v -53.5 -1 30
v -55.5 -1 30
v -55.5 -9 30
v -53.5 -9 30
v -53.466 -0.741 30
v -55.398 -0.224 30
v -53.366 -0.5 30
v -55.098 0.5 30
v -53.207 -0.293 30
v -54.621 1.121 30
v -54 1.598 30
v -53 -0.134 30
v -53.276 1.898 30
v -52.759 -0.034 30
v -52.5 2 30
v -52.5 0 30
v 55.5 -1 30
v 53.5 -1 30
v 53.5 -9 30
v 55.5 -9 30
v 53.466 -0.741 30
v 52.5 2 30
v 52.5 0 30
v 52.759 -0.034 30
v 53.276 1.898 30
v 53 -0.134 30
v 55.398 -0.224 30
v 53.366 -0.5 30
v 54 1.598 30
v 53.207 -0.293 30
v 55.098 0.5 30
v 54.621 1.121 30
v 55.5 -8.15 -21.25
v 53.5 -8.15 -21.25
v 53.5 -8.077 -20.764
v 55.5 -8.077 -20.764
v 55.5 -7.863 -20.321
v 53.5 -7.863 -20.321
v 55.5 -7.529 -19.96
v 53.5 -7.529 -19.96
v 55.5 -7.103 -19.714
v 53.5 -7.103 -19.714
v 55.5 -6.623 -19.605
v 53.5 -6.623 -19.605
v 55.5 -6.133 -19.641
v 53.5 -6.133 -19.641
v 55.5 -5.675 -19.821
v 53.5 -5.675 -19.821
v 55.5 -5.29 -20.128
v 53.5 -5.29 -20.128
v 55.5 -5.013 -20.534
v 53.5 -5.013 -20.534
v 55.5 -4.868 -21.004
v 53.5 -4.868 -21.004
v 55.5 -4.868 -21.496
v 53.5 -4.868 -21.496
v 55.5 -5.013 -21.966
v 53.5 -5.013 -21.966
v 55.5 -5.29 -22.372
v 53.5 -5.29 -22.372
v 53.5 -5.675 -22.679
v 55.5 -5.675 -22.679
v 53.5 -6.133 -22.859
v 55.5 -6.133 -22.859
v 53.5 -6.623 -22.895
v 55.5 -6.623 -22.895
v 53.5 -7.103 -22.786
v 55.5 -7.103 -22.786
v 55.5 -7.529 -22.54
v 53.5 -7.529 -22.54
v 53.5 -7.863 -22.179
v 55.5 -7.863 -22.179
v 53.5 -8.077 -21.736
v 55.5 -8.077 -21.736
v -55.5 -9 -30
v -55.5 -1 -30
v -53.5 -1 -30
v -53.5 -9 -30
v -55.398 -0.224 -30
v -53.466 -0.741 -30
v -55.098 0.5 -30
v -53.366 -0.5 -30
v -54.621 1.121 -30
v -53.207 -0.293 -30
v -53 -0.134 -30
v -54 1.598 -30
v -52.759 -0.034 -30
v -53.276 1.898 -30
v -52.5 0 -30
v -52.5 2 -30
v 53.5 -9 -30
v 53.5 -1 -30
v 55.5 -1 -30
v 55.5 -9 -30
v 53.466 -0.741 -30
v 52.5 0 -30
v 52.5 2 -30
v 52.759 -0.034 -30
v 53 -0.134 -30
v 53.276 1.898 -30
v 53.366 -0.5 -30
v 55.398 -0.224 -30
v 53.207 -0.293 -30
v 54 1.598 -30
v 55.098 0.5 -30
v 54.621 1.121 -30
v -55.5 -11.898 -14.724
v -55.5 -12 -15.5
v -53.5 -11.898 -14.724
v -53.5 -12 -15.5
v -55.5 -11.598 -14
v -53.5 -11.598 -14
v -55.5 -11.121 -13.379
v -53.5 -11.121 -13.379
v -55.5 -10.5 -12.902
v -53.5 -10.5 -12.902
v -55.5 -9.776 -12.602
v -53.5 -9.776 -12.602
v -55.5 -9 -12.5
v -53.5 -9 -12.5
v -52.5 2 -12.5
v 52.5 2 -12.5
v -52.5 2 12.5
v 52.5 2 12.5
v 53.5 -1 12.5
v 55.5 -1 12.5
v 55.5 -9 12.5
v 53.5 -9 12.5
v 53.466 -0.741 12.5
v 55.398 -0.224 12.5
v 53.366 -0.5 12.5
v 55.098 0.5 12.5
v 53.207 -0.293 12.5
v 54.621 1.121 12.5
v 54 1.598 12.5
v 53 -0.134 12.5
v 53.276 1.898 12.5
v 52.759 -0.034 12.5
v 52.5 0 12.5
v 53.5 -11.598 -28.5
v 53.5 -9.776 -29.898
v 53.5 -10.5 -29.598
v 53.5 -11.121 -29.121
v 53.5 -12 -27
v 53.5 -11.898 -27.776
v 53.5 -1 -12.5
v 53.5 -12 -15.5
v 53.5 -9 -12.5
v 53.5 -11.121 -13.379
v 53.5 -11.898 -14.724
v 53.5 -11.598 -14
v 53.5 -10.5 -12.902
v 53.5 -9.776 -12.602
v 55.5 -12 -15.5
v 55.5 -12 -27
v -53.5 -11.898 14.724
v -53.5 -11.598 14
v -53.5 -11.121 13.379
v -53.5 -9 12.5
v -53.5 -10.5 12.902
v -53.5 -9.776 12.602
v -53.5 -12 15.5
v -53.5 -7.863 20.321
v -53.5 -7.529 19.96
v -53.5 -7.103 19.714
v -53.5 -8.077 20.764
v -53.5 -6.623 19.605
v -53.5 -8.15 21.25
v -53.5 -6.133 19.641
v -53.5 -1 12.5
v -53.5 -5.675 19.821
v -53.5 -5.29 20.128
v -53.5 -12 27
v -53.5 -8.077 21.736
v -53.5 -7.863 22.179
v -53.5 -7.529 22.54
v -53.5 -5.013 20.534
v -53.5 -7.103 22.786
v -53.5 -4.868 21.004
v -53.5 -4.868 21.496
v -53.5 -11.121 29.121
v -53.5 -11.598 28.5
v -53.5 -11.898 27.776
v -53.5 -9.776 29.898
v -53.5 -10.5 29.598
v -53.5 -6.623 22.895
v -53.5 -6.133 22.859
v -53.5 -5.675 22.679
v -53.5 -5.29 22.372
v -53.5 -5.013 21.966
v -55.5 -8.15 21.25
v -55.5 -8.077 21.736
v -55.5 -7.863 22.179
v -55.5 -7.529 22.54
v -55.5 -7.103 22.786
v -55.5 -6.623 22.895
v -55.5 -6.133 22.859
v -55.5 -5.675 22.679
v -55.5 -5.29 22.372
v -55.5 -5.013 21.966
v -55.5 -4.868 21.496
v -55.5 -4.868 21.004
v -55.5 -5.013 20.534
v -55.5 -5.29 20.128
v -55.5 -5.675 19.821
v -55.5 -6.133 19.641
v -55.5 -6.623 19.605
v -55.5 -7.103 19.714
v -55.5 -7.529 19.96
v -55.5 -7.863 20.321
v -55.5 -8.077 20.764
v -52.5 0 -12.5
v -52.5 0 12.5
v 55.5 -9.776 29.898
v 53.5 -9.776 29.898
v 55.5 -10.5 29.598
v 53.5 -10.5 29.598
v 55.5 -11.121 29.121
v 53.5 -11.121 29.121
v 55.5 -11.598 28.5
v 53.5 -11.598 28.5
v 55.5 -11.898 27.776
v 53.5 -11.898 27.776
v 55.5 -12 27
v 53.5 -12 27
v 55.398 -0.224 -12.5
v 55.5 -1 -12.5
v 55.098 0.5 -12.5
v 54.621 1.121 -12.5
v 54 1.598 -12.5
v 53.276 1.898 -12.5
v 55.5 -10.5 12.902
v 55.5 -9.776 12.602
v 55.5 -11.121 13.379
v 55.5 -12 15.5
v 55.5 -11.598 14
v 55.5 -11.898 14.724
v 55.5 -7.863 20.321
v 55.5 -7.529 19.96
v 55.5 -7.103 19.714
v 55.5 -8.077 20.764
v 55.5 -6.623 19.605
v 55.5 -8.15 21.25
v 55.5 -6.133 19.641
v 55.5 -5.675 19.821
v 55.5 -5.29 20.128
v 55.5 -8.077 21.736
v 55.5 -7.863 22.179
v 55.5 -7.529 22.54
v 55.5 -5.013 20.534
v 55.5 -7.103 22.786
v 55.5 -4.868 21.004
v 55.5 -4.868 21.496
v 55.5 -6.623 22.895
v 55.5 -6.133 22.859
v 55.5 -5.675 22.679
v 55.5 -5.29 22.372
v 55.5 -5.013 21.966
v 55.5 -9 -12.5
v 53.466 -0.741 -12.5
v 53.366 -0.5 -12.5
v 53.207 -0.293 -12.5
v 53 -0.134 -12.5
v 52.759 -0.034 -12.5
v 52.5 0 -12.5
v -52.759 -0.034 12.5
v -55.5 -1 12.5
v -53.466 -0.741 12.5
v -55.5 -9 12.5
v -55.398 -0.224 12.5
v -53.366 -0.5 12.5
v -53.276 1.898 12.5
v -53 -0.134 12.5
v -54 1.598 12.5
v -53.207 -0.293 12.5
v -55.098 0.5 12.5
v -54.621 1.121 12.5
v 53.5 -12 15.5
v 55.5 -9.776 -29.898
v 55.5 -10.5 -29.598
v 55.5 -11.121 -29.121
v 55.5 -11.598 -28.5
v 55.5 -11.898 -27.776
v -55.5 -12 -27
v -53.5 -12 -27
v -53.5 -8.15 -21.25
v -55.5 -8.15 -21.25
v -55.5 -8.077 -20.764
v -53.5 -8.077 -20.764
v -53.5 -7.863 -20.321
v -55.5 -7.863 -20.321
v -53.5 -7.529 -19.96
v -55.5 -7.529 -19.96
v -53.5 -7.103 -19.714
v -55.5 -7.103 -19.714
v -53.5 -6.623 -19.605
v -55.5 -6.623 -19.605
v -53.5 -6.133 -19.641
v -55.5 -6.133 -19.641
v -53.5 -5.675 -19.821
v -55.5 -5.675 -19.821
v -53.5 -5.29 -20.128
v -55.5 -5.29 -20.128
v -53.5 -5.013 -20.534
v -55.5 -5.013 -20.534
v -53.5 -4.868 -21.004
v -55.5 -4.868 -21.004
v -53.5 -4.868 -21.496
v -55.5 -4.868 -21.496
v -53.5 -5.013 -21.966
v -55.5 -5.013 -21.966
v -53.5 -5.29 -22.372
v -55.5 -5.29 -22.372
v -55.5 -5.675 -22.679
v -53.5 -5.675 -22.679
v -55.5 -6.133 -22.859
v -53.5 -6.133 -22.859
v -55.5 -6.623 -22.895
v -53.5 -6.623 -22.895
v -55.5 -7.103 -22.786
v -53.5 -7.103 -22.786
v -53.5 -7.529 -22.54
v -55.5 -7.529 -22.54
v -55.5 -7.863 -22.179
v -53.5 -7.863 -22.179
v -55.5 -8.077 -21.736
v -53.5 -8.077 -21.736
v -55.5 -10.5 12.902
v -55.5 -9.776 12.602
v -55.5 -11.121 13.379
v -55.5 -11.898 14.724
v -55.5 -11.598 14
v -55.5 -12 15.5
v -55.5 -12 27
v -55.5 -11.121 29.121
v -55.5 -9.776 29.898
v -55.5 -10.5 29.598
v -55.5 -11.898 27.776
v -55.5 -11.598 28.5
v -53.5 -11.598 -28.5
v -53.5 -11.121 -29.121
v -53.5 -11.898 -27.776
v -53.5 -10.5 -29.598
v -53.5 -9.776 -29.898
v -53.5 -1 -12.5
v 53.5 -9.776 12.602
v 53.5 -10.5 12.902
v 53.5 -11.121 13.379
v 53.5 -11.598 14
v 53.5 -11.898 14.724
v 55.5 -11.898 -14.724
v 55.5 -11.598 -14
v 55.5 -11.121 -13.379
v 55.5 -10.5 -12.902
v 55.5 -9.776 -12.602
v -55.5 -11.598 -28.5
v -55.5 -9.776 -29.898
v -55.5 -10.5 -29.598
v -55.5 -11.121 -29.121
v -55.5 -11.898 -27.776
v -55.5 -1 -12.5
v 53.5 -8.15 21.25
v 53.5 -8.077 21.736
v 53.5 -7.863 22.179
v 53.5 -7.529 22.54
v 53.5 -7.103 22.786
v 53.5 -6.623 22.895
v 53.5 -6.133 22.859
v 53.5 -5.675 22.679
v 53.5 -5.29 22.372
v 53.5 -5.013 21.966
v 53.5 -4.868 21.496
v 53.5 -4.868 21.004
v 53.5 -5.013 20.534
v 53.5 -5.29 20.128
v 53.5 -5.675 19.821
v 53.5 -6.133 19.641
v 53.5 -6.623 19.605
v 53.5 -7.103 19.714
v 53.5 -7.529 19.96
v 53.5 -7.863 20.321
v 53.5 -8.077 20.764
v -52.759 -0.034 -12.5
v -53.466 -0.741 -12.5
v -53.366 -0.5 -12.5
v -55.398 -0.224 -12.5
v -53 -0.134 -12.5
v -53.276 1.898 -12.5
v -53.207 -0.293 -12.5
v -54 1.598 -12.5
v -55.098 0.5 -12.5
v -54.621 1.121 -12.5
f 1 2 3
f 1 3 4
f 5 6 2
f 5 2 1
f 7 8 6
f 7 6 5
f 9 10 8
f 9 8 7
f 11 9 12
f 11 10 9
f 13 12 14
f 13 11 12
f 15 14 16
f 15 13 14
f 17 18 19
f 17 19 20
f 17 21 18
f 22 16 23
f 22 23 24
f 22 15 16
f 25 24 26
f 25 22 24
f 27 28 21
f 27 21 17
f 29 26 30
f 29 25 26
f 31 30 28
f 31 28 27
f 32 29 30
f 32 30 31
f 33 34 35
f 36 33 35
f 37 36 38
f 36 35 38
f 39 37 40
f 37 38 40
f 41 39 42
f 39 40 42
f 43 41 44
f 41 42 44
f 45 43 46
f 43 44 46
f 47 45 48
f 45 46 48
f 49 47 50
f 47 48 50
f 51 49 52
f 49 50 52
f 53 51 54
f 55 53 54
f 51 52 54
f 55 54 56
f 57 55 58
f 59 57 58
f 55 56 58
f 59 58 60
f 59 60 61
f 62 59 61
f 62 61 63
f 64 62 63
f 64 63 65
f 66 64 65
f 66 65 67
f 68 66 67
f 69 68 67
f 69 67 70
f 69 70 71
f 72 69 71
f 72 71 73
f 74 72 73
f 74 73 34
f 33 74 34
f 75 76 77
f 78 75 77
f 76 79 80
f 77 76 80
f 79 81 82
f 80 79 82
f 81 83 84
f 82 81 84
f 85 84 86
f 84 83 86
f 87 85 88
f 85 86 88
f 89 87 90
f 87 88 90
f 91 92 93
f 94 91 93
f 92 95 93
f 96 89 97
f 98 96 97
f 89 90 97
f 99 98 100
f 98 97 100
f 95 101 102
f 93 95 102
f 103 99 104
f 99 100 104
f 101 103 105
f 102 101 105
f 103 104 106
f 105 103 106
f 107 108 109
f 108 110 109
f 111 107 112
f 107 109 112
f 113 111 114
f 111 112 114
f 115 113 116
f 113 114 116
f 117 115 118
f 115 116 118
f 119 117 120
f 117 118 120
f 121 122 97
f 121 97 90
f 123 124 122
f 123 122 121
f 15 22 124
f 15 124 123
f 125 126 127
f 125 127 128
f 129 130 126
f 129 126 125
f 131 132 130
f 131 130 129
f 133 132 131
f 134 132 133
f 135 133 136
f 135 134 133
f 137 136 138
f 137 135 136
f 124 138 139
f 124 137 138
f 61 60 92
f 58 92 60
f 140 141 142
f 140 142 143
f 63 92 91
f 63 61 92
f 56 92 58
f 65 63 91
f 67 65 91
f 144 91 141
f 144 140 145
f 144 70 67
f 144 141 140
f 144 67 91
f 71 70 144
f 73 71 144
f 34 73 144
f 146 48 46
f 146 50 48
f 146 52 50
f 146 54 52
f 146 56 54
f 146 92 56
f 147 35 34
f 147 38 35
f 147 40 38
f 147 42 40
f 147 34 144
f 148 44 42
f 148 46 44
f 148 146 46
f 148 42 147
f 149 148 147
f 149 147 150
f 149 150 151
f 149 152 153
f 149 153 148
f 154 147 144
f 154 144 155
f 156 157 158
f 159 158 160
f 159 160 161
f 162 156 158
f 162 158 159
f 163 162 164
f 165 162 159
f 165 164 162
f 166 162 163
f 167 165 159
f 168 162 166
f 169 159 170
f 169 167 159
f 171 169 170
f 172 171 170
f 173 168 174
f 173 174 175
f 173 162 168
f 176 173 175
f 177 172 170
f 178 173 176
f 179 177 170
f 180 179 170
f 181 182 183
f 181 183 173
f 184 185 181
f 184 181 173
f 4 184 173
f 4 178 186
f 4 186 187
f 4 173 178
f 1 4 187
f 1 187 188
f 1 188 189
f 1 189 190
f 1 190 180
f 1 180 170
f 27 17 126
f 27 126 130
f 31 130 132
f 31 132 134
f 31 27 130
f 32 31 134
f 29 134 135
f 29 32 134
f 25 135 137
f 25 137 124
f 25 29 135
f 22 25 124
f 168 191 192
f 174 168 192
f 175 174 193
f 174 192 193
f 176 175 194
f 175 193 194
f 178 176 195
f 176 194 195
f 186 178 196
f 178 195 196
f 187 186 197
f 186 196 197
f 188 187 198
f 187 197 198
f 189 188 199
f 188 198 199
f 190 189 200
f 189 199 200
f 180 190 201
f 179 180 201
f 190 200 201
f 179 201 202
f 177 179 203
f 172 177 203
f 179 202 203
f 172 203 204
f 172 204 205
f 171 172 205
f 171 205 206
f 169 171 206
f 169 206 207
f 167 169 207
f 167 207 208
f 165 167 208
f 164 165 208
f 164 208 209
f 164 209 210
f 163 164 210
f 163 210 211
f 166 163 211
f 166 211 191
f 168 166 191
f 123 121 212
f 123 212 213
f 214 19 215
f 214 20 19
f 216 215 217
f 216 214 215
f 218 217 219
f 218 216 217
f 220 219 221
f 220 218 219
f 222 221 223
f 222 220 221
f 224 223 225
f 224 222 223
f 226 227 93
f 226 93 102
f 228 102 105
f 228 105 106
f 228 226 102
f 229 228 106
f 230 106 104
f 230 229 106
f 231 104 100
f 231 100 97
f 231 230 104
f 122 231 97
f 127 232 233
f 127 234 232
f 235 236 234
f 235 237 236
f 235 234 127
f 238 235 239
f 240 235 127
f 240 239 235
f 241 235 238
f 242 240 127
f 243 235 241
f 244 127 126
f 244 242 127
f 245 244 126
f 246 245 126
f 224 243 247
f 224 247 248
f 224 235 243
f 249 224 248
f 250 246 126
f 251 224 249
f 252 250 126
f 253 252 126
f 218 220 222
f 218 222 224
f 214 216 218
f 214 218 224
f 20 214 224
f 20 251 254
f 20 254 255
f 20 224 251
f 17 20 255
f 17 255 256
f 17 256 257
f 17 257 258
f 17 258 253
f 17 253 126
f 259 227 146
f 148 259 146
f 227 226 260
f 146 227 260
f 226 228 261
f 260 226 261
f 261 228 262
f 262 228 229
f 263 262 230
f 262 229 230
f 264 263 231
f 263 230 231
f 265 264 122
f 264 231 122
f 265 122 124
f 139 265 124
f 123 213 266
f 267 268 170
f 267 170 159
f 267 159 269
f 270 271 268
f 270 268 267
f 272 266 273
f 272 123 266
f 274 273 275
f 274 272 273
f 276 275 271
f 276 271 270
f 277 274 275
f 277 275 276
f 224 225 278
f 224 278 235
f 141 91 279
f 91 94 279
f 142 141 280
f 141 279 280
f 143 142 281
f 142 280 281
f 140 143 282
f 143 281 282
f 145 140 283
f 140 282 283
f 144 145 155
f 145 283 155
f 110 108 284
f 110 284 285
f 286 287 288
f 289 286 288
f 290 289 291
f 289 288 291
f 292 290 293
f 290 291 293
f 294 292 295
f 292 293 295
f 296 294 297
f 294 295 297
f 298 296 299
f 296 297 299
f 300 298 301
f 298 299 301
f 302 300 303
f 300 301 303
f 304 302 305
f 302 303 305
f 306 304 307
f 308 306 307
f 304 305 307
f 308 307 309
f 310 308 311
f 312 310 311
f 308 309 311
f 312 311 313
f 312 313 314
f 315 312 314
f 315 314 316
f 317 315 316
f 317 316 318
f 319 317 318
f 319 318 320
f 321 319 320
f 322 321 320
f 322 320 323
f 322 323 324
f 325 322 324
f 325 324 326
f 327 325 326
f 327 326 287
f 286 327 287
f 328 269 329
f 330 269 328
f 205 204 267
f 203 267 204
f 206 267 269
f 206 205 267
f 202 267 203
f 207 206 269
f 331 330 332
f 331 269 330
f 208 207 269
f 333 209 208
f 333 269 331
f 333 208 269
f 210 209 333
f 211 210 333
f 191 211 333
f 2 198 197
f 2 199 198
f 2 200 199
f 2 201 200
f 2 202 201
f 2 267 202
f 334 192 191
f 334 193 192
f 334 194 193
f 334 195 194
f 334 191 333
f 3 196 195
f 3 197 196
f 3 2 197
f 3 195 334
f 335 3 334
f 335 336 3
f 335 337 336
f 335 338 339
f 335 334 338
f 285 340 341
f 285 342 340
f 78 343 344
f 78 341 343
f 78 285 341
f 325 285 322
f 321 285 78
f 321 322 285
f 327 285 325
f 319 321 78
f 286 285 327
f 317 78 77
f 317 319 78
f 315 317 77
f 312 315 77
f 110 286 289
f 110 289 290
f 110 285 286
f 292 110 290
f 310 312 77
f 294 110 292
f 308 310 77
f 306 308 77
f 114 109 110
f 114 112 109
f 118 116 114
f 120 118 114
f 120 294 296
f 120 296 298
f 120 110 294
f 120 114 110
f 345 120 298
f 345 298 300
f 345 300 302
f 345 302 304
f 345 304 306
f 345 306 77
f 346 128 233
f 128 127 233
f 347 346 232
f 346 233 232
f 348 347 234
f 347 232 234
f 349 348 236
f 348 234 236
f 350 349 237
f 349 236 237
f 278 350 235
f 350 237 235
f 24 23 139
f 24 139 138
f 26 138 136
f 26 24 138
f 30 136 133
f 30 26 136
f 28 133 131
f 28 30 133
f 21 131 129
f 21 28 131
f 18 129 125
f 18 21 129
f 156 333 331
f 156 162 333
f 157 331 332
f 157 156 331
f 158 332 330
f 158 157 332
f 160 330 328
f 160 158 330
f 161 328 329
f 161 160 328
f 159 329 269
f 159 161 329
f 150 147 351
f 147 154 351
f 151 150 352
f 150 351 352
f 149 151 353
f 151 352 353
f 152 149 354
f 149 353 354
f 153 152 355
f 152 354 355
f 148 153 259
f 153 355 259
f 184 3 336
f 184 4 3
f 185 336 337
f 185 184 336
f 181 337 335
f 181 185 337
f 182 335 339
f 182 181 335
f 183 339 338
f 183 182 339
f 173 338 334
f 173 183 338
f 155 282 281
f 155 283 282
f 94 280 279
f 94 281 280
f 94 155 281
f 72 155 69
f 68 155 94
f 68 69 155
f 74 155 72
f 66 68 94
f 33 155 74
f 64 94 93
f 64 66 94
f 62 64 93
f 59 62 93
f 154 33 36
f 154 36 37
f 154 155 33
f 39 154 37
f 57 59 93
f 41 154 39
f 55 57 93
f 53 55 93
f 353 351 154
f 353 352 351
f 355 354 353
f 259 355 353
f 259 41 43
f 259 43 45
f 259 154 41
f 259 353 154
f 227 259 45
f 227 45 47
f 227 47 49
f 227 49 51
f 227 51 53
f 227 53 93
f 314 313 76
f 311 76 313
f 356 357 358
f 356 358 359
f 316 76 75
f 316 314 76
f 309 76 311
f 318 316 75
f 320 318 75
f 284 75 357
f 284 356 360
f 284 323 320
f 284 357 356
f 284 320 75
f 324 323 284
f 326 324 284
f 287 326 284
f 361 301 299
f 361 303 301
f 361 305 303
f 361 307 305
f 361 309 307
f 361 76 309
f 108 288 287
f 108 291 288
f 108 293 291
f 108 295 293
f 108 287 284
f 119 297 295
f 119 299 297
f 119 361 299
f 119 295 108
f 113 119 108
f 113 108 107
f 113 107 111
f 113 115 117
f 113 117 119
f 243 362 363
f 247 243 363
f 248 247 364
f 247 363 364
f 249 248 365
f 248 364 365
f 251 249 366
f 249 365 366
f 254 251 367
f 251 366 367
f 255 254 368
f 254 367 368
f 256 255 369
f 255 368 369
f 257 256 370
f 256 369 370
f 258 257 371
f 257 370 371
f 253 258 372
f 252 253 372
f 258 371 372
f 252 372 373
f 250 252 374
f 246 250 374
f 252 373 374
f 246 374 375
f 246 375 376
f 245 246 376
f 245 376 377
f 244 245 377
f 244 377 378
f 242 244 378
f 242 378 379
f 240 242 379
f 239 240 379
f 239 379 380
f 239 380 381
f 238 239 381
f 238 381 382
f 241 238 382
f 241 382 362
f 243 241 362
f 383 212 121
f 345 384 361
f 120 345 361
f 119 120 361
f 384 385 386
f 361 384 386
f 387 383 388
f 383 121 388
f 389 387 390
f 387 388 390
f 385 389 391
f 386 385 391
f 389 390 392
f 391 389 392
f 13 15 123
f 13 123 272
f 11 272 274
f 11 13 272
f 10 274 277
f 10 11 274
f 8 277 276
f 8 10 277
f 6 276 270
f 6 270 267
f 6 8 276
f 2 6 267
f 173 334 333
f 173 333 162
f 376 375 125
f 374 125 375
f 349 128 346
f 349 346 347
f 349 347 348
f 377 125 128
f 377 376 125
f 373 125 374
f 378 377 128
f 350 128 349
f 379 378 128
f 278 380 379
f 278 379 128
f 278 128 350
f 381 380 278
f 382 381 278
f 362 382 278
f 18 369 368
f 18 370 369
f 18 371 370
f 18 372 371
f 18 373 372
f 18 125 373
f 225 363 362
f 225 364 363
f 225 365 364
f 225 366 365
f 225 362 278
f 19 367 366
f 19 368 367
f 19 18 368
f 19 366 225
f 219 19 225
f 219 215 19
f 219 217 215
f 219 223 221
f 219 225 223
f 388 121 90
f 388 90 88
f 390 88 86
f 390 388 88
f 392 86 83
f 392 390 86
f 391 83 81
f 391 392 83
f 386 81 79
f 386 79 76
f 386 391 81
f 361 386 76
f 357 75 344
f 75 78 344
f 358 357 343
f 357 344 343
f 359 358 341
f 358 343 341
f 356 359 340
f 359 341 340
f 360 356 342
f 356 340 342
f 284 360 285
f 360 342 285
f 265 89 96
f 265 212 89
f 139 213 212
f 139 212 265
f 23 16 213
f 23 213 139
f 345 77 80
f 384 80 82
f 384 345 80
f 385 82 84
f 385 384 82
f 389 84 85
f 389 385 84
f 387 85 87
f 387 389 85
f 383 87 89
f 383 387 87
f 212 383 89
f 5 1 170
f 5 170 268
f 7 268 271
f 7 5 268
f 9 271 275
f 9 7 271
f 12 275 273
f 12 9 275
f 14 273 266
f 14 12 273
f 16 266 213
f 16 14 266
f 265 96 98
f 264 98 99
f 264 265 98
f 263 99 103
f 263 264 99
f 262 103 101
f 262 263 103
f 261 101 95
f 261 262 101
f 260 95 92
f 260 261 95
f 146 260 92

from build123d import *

# Parameters (mm, degrees)
F1_DEPTH   = 30
F2_W       = 3
F2_H       = 25
F1_FACE1_W = 105
F1_FACE1_H = 60
F3_DEPTH   = 14.001
F5_D       = 3.3
F6_R       = 3


with BuildPart() as f1:
    # F0 (on Top) → F1 (new body, symmetric)
    with BuildSketch(Plane.XY):
        with BuildLine():
            Line((-52.5, 0), (52.5, 0))
            ThreePointArc((52.5, 0), (53.2071067812, -0.2928932188), (53.5, -1))
            Line((53.5, -1), (53.5, -12))
            Line((53.5, -12), (55.5, -12))
            Line((55.5, -12), (55.5, -1))
            ThreePointArc((55.5, -1), (54.6213203436, 1.1213203436), (52.5, 2))
            Line((52.5, 2), (-52.5, 2))
            ThreePointArc((-52.5, 2), (-54.6213203436, 1.1213203436), (-55.5, -1))
            Line((-55.5, -1), (-55.5, -12))
            Line((-55.5, -12), (-53.5, -12))
            Line((-53.5, -12), (-53.5, -1))
            ThreePointArc((-53.5, -1), (-53.2071067812, -0.2928932188), (-52.5, 0))
        make_face()
    extrude(amount=F1_DEPTH, both=True)

    # F2 (on face) + F1_face1 (on face) → F3 (cut, through all)
    with BuildSketch(Plane(origin=(0, 2, 0), x_dir=(-1, 0, 0), z_dir=(0, 1, 0))):
        with Locations((-54, 0)):
            Rectangle(F2_W, F2_H)
        with Locations((54, 0)):
            Rectangle(F2_W, F2_H)
    with BuildSketch(Plane.XZ):
        Rectangle(F1_FACE1_W, F1_FACE1_H)
    extrude(amount=-F3_DEPTH, dir=(0, 1, 0), mode=Mode.SUBTRACT)

    # F5 (through all)
    with Locations(Plane.YZ.offset(55.5)):
        with Locations((-6.5, 21.25), (-6.5, -21.25)):
            Hole(F5_D / 2)

    # F6
    f6_edges = [f1.edges().sort_by_distance(p)[0] for p in [
        (-54.5, -12, 30),
        (-54.5, -12, 12.5),
        (-54.5, -12, -12.5),
        (-54.5, -12, -30),
        (54.5, -12, 30),
        (54.5, -12, 12.5),
        (54.5, -12, -12.5),
        (54.5, -12, -30),
    ]]
    fillet(f6_edges, radius=F6_R)


solid = f1.part
